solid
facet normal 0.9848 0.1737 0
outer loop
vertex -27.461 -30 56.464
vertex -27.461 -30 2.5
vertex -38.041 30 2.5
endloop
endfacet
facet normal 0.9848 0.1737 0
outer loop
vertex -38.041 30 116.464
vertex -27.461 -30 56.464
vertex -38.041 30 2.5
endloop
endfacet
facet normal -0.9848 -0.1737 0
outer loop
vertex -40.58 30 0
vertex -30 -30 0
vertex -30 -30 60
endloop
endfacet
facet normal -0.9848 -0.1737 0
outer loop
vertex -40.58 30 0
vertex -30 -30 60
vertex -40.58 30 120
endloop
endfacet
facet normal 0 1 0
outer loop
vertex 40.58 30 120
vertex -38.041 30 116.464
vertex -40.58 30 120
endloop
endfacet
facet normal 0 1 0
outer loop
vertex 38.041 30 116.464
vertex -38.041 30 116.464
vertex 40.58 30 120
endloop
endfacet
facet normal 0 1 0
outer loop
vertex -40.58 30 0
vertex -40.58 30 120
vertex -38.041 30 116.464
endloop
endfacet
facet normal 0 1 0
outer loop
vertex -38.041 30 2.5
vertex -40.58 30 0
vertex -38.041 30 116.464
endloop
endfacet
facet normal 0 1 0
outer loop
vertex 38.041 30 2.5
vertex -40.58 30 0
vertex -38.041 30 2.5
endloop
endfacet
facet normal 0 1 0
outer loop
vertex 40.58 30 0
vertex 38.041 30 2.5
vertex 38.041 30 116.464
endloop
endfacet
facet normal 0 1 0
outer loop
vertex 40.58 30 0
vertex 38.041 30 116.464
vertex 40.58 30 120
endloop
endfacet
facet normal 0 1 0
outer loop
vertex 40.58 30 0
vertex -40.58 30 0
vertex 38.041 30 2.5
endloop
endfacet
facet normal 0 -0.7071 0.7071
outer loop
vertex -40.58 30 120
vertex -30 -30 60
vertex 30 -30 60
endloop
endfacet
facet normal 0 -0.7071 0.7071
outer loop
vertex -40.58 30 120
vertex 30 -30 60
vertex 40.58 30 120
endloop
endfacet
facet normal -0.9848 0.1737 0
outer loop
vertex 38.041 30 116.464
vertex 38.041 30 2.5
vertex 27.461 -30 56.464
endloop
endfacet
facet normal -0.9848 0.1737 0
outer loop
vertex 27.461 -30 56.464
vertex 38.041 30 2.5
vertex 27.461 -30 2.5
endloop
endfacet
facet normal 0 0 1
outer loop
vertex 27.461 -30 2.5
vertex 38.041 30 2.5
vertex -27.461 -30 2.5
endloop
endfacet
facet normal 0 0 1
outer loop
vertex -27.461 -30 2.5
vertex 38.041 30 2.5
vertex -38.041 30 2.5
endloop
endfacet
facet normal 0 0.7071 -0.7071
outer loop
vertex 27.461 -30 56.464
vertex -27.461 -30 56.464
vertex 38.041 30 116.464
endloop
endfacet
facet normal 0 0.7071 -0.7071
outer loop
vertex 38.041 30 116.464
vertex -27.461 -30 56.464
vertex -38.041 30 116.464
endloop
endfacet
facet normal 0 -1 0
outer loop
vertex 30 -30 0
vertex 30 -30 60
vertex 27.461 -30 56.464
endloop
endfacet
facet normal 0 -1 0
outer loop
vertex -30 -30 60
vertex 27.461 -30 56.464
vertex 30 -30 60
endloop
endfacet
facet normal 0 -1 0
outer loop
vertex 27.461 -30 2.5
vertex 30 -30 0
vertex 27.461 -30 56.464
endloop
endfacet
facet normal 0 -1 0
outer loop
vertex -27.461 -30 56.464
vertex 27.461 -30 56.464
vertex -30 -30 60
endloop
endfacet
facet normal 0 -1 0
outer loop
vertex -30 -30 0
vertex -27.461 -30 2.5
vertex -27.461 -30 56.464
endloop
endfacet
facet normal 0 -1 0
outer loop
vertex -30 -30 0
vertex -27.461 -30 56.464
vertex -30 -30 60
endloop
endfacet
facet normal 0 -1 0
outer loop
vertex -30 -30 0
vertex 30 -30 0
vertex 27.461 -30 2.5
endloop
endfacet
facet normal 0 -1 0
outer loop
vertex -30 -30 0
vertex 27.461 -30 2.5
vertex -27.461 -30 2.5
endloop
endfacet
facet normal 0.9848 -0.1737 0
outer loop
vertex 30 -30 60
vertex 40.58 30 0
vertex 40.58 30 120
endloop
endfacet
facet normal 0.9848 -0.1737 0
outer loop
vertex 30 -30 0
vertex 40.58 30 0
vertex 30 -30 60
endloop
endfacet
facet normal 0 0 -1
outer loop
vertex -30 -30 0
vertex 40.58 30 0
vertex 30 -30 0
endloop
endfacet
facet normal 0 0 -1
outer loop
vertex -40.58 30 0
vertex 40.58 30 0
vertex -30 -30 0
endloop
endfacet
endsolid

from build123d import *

# Parameters (mm, degrees)
BOSS_EXTRUDE1_DEPTH     = 120
CUT_EXTRUDE1_DEPTH      = 131.179512464
CUT_EXTRUDE1_DEPTH_BACK = 131.179512464
SHELL1_T                = -2.5


with BuildPart() as part:
    # Sketch1 → Boss-Extrude1 (new body)
    with BuildSketch(Plane.XY):
        Polygon((-40.579618843, 30), (40.579618843, 30), (30, -30), (-30, -30), align=None)
    extrude(amount=BOSS_EXTRUDE1_DEPTH)

    # Sketch2 → Cut-Extrude1 (cut, two sides: drawn at the far end of the back side and taken through both)
    with BuildSketch(Plane(origin=(0, 0, 0), x_dir=(0, 0, -1), z_dir=(1, 0, 0)).offset(-CUT_EXTRUDE1_DEPTH_BACK)):
        Polygon((-120, 30), (-120, -30), (-60, -30), align=None)
    extrude(amount=CUT_EXTRUDE1_DEPTH + CUT_EXTRUDE1_DEPTH_BACK, mode=Mode.SUBTRACT)

    # Shell1
    shell1_openings = [part.faces().sort_by_distance(p)[0] for p in [
        (0, -30, 30),
        (0, 30, 60),
    ]]
    offset(amount=SHELL1_T, openings=shell1_openings, kind=Kind.INTERSECTION)


solid = part.part
